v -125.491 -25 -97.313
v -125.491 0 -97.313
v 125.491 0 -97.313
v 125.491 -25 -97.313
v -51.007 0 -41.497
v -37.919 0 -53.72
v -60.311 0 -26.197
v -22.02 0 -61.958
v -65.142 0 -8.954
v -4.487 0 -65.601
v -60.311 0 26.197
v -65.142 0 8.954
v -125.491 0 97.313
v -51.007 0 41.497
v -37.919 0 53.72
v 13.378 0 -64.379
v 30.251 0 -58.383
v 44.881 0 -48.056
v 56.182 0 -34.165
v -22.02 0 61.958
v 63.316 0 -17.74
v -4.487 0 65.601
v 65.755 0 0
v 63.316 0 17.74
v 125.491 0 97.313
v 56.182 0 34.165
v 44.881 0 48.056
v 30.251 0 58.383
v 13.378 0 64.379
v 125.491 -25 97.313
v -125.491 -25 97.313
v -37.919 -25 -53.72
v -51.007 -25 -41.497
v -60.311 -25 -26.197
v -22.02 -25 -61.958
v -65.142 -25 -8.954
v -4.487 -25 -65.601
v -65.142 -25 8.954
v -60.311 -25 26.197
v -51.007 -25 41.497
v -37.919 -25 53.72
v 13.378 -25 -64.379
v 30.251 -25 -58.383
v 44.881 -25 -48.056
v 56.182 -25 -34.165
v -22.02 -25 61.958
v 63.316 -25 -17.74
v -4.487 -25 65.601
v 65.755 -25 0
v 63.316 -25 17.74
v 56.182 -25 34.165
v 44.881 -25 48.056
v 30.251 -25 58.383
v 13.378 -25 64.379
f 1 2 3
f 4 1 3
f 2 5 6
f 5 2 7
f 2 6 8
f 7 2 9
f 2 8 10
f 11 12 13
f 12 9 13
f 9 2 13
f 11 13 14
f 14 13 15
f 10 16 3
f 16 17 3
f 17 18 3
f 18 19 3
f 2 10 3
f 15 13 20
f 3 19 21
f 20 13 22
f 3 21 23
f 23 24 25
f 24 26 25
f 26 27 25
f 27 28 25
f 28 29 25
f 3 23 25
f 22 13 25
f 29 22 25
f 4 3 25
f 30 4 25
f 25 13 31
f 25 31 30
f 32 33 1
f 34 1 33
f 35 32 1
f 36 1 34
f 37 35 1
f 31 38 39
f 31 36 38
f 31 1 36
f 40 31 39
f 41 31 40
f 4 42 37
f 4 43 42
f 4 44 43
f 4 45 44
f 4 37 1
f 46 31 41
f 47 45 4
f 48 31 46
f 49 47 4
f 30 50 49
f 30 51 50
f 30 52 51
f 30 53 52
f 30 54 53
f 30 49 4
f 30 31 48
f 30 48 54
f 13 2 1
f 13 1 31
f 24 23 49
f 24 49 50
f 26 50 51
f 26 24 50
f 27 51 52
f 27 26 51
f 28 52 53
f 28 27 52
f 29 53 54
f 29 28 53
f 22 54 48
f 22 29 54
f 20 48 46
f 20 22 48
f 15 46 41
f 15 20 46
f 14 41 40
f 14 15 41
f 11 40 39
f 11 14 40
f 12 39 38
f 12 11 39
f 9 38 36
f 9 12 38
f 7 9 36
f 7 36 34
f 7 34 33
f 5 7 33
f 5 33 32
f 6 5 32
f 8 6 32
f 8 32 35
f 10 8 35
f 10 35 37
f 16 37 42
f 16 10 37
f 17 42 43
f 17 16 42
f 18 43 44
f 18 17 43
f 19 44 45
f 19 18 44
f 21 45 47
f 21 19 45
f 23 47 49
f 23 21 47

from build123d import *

# Parameters (mm, degrees)
F0_W      = 250.982642
F0_H      = 194.626228
F0_R      = 65.754774
F1_DEPTH  = 25
F1_FACE_W = 250.982642
F1_FACE_H = 194.626228
F1_FACE_R = 65.754774
F2_DEPTH  = 25


with BuildPart() as f1:
    # F0 (on Front) → F1 (new body)
    with BuildSketch(Plane.XZ):
        Rectangle(F0_W, F0_H)
        Circle(F0_R, mode=Mode.SUBTRACT)
    extrude(amount=F1_DEPTH)

    # F1_face (on face) → F2 (join)
    with BuildSketch(Plane(origin=(0, 0, 0), x_dir=(1, 0, 0), z_dir=(0, 1, 0))):
        Rectangle(F1_FACE_W, F1_FACE_H)
        Circle(F1_FACE_R, mode=Mode.SUBTRACT)
    extrude(amount=-F2_DEPTH)


solid = f1.part
